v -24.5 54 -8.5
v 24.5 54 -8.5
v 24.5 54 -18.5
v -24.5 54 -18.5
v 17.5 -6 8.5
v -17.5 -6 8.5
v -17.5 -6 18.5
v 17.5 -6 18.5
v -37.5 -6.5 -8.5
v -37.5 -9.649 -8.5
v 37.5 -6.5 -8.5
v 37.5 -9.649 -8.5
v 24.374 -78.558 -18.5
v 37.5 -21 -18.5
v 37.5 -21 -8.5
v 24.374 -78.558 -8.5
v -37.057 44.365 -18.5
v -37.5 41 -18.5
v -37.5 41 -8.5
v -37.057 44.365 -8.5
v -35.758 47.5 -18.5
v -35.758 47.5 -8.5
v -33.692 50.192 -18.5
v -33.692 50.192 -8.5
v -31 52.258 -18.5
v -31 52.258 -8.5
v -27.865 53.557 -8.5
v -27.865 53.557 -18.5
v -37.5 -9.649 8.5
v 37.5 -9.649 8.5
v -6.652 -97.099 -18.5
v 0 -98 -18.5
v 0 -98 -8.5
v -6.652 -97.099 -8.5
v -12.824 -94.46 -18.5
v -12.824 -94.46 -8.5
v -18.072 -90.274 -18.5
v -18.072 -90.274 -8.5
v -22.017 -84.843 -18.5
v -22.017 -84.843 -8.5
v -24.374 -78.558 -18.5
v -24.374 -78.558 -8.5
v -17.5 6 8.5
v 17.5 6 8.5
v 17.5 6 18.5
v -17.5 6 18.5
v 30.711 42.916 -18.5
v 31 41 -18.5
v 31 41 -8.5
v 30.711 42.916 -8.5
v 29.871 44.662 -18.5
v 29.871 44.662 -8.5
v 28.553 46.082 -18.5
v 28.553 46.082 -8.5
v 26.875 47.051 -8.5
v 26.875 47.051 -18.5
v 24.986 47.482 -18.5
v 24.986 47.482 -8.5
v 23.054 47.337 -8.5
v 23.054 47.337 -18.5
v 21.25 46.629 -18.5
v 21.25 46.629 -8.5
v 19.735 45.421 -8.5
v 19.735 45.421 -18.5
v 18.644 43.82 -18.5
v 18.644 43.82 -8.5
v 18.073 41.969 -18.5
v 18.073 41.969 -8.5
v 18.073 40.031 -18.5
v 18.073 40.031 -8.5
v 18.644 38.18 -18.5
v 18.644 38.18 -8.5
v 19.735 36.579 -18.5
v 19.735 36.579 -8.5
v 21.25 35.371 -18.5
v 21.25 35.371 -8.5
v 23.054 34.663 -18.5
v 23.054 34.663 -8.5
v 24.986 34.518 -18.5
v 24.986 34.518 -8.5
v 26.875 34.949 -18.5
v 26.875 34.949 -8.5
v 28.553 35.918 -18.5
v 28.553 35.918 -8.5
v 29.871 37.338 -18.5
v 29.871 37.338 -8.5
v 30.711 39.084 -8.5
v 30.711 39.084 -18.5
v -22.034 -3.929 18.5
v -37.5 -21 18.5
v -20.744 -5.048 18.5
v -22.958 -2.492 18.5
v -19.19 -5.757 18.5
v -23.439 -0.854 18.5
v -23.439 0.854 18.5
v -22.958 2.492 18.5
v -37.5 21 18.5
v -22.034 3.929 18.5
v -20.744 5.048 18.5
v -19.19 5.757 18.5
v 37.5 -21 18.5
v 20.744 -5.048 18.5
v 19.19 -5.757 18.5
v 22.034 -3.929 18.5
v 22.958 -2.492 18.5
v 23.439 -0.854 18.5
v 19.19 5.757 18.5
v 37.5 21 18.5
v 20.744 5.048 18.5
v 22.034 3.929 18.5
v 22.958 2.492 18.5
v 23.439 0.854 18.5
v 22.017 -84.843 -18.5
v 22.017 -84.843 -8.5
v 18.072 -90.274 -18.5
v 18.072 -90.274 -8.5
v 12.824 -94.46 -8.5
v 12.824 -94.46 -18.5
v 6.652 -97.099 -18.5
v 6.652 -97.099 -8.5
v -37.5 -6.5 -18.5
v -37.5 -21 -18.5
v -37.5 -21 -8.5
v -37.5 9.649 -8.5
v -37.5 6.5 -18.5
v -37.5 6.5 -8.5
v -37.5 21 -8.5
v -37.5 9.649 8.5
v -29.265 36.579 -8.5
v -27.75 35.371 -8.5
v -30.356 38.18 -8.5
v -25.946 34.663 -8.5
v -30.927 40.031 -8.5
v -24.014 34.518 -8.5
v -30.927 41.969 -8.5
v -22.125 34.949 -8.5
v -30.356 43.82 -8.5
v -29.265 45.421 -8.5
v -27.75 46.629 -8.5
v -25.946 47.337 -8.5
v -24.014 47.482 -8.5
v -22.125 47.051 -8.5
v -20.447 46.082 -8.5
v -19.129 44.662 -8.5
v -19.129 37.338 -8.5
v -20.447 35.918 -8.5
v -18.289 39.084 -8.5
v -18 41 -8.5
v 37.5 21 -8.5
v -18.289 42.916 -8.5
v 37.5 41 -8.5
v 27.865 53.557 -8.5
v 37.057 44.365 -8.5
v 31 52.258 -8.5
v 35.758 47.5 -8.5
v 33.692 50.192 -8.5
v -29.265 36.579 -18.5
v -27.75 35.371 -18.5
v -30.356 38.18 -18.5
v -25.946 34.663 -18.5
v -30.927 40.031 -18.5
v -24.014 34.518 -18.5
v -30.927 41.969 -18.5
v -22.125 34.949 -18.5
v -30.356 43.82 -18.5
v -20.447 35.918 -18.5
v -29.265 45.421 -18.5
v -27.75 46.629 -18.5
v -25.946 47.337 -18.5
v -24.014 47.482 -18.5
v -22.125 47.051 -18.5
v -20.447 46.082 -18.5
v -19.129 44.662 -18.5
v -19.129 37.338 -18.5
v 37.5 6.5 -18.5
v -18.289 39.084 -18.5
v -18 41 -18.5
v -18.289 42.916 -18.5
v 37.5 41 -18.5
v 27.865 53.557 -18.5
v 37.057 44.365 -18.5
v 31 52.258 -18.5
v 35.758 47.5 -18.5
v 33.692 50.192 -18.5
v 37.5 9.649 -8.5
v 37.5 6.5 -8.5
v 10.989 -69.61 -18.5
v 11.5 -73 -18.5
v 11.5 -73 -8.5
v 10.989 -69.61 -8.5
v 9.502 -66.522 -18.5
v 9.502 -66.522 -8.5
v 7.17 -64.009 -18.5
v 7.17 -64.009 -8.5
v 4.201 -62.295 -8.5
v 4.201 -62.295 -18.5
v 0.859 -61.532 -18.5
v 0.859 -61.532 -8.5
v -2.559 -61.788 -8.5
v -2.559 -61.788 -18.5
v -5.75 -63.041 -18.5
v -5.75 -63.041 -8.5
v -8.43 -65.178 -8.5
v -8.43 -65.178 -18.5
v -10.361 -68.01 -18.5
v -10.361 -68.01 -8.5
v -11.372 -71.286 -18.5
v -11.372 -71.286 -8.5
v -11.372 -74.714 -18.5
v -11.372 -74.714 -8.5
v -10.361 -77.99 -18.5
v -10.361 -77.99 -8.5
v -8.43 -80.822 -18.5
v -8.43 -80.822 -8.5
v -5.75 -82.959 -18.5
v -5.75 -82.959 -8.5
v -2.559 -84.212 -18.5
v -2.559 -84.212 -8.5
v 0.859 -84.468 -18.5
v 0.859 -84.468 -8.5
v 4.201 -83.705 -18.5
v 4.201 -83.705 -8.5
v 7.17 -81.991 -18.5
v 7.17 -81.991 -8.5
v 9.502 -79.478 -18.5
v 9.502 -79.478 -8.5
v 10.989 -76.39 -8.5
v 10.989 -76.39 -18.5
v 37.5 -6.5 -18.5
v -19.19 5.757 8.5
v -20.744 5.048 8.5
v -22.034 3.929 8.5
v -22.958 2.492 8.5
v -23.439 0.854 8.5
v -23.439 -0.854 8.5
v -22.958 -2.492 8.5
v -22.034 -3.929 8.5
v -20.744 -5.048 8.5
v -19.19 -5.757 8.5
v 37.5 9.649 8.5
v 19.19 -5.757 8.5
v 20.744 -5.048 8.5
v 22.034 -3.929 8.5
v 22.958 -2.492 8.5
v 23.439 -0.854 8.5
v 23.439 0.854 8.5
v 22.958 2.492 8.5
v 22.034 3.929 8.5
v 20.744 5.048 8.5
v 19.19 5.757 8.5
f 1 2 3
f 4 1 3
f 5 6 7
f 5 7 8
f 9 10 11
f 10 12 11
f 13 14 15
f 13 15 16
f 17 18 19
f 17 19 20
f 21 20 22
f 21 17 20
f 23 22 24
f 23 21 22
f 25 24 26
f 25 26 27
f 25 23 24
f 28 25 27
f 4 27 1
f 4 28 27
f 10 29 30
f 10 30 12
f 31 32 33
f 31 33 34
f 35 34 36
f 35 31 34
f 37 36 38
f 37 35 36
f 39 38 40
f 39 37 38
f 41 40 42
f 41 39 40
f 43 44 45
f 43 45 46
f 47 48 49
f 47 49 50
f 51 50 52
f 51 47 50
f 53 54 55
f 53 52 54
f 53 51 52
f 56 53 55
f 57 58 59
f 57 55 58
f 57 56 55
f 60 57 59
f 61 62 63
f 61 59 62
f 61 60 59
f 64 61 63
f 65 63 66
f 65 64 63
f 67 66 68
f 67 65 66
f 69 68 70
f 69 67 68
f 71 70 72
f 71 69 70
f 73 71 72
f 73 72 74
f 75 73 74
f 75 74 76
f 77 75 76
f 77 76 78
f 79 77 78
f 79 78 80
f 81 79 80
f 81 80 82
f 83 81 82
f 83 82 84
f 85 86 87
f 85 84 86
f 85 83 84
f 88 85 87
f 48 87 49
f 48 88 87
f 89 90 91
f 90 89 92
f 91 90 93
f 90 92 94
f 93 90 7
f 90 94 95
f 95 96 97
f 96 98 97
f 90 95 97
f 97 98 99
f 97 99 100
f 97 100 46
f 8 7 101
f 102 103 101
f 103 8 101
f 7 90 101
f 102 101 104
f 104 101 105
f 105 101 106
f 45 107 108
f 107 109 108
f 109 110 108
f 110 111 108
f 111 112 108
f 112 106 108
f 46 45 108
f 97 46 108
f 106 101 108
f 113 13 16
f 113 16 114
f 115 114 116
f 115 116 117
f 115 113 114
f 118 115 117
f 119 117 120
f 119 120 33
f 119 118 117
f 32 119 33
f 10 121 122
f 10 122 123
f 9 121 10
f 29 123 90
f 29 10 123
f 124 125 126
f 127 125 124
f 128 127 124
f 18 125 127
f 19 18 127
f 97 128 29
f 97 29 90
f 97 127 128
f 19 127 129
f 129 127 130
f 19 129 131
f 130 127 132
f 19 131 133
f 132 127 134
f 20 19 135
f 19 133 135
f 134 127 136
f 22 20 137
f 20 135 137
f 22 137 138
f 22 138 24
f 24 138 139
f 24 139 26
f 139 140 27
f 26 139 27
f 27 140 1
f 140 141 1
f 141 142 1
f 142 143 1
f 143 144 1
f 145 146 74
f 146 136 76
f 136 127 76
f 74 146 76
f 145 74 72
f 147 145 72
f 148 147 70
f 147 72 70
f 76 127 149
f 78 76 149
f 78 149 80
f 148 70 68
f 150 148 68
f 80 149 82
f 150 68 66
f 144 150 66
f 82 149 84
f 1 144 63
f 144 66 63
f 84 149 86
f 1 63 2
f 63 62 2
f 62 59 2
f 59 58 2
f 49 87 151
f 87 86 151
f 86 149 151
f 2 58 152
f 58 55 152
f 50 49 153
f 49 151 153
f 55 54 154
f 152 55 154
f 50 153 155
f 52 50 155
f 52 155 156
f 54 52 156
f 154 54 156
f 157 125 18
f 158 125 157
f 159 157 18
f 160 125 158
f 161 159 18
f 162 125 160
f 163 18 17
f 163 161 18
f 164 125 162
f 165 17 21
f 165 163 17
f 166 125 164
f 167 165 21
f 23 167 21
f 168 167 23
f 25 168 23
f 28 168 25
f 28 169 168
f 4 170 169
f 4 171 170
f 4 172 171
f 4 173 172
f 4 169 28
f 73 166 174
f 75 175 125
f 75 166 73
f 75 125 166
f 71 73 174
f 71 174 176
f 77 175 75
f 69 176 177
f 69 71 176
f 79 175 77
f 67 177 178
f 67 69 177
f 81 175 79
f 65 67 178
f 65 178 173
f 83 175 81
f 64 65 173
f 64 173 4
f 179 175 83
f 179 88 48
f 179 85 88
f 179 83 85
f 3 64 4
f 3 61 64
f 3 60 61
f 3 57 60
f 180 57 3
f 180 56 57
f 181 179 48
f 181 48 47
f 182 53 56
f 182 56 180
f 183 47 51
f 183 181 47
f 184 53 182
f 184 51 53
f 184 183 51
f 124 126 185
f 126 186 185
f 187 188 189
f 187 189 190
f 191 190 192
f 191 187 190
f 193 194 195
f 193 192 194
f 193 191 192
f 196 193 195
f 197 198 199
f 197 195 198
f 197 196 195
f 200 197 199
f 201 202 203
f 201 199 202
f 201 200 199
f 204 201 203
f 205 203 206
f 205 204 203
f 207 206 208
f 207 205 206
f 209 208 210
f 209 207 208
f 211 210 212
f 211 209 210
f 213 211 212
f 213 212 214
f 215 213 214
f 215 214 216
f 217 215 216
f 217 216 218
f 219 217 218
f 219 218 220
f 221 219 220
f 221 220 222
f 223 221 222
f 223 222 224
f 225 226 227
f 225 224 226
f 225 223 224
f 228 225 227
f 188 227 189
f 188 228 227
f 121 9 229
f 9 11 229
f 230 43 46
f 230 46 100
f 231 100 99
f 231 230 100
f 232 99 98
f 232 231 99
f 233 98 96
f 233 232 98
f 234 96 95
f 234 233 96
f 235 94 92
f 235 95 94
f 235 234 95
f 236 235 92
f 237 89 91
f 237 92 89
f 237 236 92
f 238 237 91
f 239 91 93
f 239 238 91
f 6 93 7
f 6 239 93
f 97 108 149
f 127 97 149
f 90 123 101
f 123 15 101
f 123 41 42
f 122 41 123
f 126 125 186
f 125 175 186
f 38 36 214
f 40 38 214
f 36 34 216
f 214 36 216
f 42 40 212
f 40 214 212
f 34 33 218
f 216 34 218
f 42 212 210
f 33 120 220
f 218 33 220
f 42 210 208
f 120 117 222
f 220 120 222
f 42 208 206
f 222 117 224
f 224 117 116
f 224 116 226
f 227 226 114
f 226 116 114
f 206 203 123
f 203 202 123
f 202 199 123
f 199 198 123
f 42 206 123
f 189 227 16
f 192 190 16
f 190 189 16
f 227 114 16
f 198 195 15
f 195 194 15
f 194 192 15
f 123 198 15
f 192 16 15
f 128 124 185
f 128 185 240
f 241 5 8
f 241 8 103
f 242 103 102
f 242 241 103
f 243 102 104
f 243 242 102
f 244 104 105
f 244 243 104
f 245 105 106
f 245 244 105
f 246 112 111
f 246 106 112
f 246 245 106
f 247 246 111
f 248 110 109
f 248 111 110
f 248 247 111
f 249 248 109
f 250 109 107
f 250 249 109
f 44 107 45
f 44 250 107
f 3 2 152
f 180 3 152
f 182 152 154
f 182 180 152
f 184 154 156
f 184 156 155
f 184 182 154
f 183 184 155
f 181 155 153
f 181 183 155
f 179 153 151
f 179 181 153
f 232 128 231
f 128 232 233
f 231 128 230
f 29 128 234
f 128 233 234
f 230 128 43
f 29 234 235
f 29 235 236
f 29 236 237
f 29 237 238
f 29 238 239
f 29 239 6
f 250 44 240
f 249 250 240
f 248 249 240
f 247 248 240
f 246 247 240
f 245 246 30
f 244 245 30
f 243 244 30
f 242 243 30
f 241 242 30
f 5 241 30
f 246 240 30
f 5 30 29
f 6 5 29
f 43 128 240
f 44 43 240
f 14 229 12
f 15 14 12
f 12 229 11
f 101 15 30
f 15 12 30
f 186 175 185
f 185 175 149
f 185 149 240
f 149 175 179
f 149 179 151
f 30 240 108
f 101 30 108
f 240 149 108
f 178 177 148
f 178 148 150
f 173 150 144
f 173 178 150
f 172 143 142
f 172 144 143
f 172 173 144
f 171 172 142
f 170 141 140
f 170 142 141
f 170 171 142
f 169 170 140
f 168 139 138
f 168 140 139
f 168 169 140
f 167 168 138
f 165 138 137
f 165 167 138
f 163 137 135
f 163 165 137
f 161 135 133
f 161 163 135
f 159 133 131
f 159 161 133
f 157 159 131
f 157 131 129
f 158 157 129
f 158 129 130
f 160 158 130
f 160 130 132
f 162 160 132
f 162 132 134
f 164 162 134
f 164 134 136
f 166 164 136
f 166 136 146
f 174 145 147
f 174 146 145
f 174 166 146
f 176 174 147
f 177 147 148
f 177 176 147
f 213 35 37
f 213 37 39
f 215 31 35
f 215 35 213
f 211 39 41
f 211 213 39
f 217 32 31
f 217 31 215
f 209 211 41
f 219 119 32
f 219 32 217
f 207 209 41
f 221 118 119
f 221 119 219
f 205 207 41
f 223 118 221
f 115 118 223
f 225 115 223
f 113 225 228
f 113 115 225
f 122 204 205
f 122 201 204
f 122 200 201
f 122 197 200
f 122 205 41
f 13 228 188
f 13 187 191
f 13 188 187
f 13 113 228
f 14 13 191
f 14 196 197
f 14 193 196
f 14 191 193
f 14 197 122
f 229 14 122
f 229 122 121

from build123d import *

# Parameters (mm, degrees)
BOSS_EXTRUDE1_DEPTH     = 37.5
CUT_EXTRUDE1_DEPTH      = 107.548111199
CUT_EXTRUDE1_DEPTH_BACK = 107.548111199
SKETCH2_R               = 11.5
SKETCH2_R_2             = 6.5


with BuildPart() as part:
    # Sketch1 → Boss-Extrude1 (new, symmetric)
    with BuildSketch(Plane(origin=(0, 0, 0), x_dir=(0, 0, -1), z_dir=(1, 0, 0))):
        Polygon((8.5, 21), (8.5, 54), (18.5, 54), (18.5, 21), (18.5, 6.5), (8.5, 6.5), (8.5, 9.648648649), (-8.5, 9.648648649), (-8.5, -9.648648649), (8.5, -9.648648649), (8.5, -6.5), (18.5, -6.5), (18.5, -21), (18.5, -98), (8.5, -98), (8.5, -21), (-18.5, -21), (-18.5, 21), align=None)
    extrude(amount=BOSS_EXTRUDE1_DEPTH, both=True)

    # Sketch2 → Cut-Extrude1 (cut, two sides: drawn at the far end of the back side and taken through both)
    with BuildSketch(Plane.XY.offset(-CUT_EXTRUDE1_DEPTH_BACK)):
        with BuildLine():
            Line((37.5, -98), (37.5, -21))
            Line((37.5, -21), (24.374261359, -78.558361557))
            ThreePointArc((24.374261359, -78.558361557), (15.589114141, -92.544296362), (-6.8e-08, -98))
            Line((-6.8e-08, -98), (37.5, -98))
        make_face()
        with Locations((0, -73)):
            Circle(SKETCH2_R)
        with BuildLine():
            Line((-37.5, -98), (-6.8e-08, -98))
            ThreePointArc((-6.8e-08, -98), (-15.589114194, -92.54429632), (-24.374261359, -78.558361557))
            Line((-24.374261359, -78.558361557), (-37.5, -21))
            Line((-37.5, -21), (-37.5, -98))
        make_face()
        with BuildLine():
            Line((-17.5, -6), (17.5, -6))
            ThreePointArc((17.5, -6), (23.5, 0), (17.5, 6))
            Line((17.5, 6), (-17.5, 6))
            ThreePointArc((-17.5, 6), (-23.5, 0), (-17.5, -6))
        make_face()
        with Locations((24.5, 41)):
            Circle(SKETCH2_R_2)
        with Locations((-24.5, 41)):
            Circle(SKETCH2_R_2)
        with BuildLine():
            Line((37.5, 54), (24.5, 54))
            ThreePointArc((24.5, 54), (33.692388155, 50.192388155), (37.5, 41))
            Line((37.5, 41), (37.5, 54))
        make_face()
        with BuildLine():
            Line((-37.5, 54), (-37.5, 41))
            ThreePointArc((-37.5, 41), (-33.692388155, 50.192388155), (-24.5, 54))
            Line((-24.5, 54), (-37.5, 54))
        make_face()
    extrude(amount=CUT_EXTRUDE1_DEPTH + CUT_EXTRUDE1_DEPTH_BACK, mode=Mode.SUBTRACT)


solid = part.part
